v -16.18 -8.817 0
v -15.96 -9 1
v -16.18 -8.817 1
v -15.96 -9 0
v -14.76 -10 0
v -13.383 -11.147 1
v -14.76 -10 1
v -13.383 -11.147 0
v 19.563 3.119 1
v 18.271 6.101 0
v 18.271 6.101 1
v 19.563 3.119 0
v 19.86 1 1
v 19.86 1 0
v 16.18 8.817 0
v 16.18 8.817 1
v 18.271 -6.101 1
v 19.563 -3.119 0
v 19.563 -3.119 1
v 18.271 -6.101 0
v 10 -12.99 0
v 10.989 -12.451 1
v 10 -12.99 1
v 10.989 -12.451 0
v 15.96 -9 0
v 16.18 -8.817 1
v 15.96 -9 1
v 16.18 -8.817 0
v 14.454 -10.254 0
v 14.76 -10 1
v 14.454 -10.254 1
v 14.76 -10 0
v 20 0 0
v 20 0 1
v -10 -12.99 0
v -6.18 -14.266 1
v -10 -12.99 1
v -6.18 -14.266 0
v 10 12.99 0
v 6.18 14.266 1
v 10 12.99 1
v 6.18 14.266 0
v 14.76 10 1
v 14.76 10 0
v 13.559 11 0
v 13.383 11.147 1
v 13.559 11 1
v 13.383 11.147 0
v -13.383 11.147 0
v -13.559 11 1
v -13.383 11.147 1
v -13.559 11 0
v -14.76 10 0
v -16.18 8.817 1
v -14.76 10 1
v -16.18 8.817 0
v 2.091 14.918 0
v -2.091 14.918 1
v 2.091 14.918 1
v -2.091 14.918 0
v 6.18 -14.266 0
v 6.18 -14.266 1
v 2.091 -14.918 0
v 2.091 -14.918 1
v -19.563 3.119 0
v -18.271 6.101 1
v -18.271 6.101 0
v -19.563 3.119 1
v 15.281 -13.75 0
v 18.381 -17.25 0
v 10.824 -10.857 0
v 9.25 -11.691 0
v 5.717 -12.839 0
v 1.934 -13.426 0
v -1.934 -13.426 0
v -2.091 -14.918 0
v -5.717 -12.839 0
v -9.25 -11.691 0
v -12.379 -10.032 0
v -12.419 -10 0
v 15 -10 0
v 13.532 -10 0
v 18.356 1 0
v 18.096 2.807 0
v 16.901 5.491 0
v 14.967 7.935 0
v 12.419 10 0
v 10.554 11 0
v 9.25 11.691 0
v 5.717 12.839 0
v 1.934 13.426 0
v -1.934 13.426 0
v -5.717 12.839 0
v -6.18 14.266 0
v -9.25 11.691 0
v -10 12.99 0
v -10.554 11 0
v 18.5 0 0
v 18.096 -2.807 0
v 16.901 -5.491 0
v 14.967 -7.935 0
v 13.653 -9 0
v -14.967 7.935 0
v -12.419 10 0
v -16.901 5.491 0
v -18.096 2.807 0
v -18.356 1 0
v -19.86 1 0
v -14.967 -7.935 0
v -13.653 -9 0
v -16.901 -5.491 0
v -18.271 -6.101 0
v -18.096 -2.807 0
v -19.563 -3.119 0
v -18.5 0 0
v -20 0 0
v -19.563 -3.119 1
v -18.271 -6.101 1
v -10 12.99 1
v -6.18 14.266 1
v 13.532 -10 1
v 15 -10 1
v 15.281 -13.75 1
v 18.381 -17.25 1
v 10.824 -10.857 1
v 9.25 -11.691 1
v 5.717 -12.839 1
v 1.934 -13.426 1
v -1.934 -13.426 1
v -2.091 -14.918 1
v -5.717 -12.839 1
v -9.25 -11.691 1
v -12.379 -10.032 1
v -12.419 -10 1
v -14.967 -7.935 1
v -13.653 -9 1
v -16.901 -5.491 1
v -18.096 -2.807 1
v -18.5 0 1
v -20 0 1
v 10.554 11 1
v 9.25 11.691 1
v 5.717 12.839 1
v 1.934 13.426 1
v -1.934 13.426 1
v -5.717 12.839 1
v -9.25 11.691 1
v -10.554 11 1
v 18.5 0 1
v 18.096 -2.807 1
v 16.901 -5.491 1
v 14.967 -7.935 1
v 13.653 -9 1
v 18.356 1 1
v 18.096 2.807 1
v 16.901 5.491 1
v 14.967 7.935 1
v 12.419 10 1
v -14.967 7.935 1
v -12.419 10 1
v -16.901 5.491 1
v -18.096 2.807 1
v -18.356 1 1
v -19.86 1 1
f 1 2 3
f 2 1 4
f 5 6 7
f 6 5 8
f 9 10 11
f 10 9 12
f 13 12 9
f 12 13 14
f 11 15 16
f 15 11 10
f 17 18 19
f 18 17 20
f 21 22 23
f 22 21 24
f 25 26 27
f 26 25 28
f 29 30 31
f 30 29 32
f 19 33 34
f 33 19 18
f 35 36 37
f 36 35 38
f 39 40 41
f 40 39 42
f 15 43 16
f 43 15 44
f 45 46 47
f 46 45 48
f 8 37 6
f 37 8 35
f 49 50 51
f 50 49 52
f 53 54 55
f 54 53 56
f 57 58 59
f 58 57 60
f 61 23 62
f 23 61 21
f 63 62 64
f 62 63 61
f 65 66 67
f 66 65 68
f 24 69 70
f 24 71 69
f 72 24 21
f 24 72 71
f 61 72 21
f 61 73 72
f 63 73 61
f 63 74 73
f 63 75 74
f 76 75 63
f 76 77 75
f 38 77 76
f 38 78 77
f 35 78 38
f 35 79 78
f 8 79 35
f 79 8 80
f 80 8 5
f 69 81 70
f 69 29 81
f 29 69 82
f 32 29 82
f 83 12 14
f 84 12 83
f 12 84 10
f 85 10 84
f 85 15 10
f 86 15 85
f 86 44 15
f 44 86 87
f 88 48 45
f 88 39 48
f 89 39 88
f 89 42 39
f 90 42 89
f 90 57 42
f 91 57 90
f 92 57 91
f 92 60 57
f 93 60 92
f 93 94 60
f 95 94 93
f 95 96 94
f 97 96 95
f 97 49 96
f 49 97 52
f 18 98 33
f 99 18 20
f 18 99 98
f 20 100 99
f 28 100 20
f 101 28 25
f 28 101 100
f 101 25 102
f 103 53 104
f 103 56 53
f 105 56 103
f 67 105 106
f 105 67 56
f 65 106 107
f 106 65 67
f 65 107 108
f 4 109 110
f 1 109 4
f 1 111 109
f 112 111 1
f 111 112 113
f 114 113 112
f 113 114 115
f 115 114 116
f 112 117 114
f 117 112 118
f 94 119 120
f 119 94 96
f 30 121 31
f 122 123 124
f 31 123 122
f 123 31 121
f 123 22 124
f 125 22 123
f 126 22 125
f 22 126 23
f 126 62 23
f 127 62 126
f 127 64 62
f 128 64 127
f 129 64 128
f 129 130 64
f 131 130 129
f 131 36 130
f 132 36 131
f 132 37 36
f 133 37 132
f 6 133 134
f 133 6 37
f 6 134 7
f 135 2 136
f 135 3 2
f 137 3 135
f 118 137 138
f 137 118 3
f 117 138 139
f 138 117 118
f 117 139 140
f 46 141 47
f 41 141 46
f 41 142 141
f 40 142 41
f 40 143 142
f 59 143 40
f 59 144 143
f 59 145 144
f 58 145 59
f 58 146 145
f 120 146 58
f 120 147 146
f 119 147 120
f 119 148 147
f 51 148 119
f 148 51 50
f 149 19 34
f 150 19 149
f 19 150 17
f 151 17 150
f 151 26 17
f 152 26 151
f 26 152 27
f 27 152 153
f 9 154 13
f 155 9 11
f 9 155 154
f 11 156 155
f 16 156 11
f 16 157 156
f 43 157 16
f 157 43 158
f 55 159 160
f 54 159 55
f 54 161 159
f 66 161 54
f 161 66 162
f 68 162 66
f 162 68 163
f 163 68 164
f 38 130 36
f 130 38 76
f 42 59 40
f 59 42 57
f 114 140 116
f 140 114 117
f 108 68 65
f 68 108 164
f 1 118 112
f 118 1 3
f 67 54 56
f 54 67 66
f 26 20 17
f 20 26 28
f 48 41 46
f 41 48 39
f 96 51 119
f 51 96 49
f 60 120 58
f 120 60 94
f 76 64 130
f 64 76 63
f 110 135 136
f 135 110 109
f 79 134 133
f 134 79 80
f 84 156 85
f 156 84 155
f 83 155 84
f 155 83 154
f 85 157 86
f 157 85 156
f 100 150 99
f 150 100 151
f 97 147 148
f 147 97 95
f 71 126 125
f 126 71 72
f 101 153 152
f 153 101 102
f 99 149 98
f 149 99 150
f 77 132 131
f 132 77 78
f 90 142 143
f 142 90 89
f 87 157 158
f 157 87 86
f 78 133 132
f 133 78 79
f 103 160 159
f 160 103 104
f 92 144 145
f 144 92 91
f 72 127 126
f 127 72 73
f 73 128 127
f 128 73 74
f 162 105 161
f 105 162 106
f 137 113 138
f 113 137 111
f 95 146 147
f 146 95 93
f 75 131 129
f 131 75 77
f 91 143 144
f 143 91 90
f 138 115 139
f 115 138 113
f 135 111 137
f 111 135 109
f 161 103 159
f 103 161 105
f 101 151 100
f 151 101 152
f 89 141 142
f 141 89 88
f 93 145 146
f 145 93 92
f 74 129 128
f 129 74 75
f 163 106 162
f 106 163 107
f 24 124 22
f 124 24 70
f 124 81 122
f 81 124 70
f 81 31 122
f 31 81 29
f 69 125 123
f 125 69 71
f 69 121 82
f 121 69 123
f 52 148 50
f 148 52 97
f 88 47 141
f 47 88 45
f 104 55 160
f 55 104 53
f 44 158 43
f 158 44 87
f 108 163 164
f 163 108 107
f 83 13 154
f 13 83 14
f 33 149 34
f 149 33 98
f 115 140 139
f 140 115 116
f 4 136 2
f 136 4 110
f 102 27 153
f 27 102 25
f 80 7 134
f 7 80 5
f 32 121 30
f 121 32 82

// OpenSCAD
// file: ../../../open-oval/open-oval.scad
use <MCAD/shapes.scad>
//use </usr/share/openscad/libraries/MCAD/shapes.scad>
//use </Applications/OpenSCAD.app/Contents/Resources/libraries/MCAD/shapes.scad>

module openOval(borderThickness = 3, yLength = 10, zLength = 1)
{
	openOval2d(borderThickness = borderThickness,
			   depth = zLength,
			   height = yLength);
}

/** Support functions and modules follow.  **/

module openOval2d(borderThickness = 3,
				  depth = 5,
				  height = 10,
				  width = 20)
{
	difference()
	{
		ellipticalCylinder(w = width, h = height, height = depth);

		w = width - borderThickness;
		h = height - borderThickness;
		translate([0, 0, -0.02])
		ellipticalCylinder(w = w, h = h, height = depth + 0.1);
	}
}
// file: ../../dialog-bubble.scad
use <MCAD/triangles.scad>
//use <MCAD/shapes.scad>

use <../open-oval/open-oval.scad>

module dialogBubble(pointerRotateZ = 25,
					yLength = 10)
{
	difference()
	{
		dialogBubble_block(pointerRotateZ, yLength);

		dialogBubble_cutouts(pointerRotateZ, yLength);
	}

//	dialogBubble_cutouts(pointerRotateZ, yLength);
}

/** Support functions and modules follow.  **/

module dialogBubble_block(pointerRotateZ, yLength)
{
	union()
	{
//		% // transparent
		openOval(borderThickness = 1.5,
				 yLength = yLength);

		dialogBubble_pointer(pointerRotateZ, yLength);
	}
}

module dialogBubble_cutouts(pointerRotateZ, yLength)
{

	translate([-3.1, 3.5, -0.1])
	scale([1, 1, 1.4])
	dialogBubble_pointer(pointerRotateZ, yLength);
}

module dialogBubble_pointer(pointerRotateZ, yLength)
{
	yTranslate = -5;
	yTranslate = -yLength + 5;
	rotateZ = pointerRotateZ;
	translate([15, yTranslate, 0])
	rotate([0, 0, rotateZ])
	triangle(o_len = -8, a_len = -5, depth=1);
}
// file: ../stencil-dialog-bubble.scad
use <../dialog-bubble.scad>

module stencilDialogBubble()
{
	difference()
	{
		yLength = 15;

		dialogBubble(yLength = yLength);

		stencilDialogBubble_lines(yLength);
	}
}

module stencilDialogBubble_lines(yLength)
{
	xLength = 100;
	xTranslate = -yLength - 15;
	translate([xTranslate, 0, -0.2])
	scale([1,1,2])
	union()
	{
		// horizontal 0
		translate([0,10,0])
		cube([xLength, 1, 1]);

		// horizontal 1
		cube([xLength, 1, 1]);

		// horizontal 2
		translate([0,-10,0])
		cube([xLength, 1, 1]);
	}
}
// main file
use <../stencil-dialog-bubble.scad>

stencilDialogBubble();
